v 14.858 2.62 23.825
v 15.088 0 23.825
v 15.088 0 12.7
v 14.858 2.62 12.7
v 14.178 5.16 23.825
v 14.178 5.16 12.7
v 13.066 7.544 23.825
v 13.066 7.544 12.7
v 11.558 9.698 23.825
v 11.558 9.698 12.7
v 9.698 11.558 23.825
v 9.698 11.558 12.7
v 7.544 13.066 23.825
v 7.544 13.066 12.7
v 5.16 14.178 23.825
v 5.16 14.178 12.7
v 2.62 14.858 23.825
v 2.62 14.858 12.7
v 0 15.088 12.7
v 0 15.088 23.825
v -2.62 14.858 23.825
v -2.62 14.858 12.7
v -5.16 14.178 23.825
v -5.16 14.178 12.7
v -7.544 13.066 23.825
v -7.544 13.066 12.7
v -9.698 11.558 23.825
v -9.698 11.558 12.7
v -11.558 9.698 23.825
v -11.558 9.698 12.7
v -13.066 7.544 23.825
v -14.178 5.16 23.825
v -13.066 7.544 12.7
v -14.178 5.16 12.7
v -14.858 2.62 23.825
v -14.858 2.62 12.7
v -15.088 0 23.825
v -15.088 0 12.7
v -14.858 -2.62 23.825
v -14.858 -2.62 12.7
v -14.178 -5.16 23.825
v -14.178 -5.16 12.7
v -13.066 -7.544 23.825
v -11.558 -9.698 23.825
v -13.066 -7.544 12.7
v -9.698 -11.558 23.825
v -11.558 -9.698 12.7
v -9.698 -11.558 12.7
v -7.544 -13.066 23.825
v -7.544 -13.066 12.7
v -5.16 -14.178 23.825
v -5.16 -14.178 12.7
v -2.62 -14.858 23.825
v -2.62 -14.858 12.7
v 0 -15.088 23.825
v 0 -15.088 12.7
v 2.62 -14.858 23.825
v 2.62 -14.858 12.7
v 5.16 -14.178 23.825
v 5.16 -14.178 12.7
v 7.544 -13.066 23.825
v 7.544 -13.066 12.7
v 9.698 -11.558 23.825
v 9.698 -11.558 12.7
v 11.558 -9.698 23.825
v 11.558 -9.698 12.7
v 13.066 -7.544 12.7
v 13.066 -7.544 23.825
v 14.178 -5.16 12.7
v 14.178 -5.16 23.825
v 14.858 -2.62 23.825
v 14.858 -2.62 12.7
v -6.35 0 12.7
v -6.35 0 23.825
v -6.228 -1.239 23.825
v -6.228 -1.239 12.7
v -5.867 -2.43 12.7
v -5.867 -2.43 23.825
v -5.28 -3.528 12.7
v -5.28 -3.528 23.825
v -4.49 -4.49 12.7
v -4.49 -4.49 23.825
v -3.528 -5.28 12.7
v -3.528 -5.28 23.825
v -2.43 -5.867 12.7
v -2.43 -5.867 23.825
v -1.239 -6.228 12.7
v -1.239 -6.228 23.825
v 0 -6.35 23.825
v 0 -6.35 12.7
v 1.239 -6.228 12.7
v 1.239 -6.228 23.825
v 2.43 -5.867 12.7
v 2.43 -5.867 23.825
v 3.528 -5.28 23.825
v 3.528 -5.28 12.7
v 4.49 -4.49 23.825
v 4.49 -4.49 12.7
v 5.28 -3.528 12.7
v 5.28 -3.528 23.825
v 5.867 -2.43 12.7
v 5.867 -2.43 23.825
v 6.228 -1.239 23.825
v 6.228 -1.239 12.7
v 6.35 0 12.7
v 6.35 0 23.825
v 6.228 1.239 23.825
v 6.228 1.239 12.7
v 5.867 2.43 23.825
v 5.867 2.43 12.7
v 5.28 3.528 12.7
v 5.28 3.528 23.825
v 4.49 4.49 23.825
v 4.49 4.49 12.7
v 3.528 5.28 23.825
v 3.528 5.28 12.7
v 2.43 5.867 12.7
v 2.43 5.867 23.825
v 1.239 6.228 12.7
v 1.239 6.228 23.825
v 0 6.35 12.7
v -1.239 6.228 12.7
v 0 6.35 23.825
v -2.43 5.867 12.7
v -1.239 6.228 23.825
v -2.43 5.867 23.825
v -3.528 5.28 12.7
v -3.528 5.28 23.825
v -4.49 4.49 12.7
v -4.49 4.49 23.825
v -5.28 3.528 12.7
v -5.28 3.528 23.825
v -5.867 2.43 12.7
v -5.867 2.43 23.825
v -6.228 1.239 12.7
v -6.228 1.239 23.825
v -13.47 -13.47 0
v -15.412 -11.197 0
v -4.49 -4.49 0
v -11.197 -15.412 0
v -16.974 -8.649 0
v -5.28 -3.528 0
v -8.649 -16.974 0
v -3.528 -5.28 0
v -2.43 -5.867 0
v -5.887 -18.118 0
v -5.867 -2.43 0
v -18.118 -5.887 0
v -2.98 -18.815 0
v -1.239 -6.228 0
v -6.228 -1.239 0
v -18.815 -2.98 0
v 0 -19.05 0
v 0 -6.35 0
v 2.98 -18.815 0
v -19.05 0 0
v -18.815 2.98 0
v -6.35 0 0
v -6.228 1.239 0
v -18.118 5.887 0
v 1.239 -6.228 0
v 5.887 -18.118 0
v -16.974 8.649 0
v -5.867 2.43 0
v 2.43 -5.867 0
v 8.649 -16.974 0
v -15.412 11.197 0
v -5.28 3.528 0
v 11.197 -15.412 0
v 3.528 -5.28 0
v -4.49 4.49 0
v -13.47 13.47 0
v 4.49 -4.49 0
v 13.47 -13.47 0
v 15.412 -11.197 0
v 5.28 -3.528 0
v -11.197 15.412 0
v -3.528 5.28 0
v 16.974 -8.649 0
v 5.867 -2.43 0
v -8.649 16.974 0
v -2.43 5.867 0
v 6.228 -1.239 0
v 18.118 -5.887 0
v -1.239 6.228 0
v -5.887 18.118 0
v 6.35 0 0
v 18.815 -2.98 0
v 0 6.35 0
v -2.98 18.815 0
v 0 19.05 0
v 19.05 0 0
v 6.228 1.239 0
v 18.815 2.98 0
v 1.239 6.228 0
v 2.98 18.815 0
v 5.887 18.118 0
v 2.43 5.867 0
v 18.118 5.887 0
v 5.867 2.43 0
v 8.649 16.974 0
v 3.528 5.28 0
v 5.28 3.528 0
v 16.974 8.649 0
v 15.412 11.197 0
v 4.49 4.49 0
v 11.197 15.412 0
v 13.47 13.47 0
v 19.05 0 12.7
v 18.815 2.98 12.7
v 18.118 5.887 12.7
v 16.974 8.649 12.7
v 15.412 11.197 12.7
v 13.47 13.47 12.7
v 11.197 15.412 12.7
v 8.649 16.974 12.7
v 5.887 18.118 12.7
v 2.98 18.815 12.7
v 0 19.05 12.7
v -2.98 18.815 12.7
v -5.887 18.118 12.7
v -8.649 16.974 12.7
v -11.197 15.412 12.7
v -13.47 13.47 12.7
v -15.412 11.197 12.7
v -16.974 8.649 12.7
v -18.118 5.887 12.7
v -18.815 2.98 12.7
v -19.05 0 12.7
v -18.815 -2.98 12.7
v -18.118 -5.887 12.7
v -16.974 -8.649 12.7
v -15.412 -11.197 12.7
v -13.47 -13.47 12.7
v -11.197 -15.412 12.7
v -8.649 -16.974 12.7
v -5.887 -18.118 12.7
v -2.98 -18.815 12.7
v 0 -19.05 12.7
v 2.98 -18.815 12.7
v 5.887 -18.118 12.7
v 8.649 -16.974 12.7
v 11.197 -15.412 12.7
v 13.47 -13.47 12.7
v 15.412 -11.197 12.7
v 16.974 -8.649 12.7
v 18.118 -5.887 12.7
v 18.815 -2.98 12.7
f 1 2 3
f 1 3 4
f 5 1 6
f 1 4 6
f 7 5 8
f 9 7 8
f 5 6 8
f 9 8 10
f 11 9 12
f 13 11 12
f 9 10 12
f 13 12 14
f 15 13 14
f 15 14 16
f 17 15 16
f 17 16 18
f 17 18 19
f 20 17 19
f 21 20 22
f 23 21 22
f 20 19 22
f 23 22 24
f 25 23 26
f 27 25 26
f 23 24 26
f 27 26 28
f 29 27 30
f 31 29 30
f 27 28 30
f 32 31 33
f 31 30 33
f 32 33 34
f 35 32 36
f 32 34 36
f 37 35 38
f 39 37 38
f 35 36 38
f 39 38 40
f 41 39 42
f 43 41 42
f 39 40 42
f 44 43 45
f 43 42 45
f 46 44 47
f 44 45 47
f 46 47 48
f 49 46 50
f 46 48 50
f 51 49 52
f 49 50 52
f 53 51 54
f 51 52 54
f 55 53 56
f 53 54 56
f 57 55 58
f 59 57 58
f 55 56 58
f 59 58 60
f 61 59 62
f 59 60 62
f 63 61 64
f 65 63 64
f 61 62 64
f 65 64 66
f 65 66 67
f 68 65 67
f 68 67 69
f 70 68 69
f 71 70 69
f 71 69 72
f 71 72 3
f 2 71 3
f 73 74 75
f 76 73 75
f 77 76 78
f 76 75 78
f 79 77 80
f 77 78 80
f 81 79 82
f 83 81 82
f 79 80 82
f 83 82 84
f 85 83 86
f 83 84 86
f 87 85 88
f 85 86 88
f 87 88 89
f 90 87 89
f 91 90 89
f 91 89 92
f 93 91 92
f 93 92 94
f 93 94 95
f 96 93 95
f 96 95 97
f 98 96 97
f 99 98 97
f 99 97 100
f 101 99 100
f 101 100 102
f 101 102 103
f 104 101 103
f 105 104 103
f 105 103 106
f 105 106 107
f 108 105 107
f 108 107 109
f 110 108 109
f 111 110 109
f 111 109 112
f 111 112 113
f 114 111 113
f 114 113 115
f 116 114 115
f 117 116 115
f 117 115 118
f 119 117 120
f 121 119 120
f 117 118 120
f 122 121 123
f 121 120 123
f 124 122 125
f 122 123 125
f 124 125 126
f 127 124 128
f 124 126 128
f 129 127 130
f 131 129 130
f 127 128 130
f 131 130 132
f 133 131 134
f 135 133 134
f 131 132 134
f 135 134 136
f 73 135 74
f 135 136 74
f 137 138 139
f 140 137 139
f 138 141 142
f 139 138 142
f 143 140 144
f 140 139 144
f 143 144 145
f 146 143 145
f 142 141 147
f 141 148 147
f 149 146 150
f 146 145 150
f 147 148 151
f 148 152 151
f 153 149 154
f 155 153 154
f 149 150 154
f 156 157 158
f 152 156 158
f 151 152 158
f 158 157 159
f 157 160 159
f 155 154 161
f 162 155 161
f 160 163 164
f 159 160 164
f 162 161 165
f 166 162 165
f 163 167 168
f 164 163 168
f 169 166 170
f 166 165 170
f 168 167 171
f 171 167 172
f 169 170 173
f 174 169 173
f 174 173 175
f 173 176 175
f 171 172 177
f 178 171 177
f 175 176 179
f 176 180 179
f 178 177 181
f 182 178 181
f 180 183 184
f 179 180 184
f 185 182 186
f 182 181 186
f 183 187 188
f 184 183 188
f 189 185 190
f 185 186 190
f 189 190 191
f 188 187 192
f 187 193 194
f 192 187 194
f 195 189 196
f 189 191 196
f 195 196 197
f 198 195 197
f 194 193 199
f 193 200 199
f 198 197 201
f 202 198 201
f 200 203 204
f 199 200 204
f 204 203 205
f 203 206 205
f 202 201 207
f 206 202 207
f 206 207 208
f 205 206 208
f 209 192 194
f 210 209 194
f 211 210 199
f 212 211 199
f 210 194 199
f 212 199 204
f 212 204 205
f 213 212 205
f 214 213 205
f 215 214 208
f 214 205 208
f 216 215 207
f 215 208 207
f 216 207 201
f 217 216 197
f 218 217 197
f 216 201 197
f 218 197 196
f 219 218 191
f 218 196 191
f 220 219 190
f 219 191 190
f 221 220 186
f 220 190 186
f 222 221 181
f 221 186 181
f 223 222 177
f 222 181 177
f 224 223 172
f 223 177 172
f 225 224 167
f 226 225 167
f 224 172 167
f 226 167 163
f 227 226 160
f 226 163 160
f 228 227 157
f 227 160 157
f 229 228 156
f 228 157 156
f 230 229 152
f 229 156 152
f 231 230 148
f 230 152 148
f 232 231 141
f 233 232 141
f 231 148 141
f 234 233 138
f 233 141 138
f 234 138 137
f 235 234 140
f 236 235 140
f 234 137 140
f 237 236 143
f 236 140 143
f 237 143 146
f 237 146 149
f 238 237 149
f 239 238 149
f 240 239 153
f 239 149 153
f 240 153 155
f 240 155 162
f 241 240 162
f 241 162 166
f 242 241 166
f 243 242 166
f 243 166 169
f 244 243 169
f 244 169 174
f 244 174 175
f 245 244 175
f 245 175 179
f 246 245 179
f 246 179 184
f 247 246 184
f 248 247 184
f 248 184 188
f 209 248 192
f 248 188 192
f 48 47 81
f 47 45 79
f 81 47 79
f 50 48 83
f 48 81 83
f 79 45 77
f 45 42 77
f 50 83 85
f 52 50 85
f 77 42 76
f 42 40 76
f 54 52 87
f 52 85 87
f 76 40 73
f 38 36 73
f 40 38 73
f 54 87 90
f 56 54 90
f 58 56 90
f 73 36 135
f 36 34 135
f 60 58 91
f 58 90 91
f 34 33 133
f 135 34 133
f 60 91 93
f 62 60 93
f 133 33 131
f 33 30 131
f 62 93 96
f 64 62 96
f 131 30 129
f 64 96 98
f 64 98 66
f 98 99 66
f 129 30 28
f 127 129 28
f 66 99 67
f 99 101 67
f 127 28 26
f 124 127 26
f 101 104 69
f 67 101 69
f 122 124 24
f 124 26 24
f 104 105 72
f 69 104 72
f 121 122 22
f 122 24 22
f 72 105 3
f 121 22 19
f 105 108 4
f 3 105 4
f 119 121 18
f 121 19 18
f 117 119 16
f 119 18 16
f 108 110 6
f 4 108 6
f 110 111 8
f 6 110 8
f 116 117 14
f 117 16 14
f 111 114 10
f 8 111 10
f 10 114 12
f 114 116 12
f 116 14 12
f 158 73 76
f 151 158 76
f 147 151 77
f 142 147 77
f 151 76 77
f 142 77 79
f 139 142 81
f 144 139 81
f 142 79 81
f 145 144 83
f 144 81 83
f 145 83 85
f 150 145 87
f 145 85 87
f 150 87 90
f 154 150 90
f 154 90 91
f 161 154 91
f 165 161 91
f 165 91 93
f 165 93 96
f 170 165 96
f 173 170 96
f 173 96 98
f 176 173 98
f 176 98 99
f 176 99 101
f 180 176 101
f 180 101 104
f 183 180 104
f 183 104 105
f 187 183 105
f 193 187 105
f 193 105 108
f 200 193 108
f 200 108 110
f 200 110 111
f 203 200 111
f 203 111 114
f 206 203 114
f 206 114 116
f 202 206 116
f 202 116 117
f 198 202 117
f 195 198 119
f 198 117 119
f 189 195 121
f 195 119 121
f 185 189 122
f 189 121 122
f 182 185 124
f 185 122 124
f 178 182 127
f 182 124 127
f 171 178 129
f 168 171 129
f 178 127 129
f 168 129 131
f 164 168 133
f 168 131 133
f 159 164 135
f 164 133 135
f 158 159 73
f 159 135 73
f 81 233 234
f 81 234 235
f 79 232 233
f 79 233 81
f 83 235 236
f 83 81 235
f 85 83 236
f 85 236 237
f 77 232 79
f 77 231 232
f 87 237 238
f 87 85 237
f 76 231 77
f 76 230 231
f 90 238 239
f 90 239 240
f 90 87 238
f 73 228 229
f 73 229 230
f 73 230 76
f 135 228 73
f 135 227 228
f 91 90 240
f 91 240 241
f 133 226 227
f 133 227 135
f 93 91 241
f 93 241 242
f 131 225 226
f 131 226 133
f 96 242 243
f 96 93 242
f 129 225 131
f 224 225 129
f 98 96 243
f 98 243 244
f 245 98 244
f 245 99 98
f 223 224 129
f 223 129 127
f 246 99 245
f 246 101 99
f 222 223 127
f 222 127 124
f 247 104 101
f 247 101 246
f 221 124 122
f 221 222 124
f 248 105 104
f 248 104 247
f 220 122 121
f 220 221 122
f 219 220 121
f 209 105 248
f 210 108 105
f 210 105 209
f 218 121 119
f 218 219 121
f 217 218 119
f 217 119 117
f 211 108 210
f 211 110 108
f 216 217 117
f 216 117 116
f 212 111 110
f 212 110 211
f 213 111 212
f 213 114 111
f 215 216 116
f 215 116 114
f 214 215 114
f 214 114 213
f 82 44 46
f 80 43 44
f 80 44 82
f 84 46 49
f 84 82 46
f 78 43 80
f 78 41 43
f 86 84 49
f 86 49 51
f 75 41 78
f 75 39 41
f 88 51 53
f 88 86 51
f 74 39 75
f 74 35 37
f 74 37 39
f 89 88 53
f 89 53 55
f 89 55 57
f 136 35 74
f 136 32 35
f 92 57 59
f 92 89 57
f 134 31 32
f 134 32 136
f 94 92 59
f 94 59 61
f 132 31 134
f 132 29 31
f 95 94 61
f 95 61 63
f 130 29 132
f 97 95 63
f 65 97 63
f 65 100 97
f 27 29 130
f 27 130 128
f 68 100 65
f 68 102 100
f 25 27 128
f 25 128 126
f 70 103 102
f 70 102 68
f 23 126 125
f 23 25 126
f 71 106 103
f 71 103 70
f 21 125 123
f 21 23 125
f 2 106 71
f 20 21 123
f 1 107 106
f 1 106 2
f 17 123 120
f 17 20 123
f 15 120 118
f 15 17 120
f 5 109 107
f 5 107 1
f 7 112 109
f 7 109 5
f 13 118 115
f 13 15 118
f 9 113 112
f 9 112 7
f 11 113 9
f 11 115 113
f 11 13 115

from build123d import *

# Parameters (mm, degrees)
F0_R     = 19.05
F1_DEPTH = 12.7
F2_R     = 15.0876
F3_DEPTH = 11.1252
F5_D     = 12.7
F5_2_D   = 12.7


with BuildPart() as f1:
    # F0 (on Top) → F1 (new body)
    with BuildSketch(Plane.XY):
        Circle(F0_R)
    extrude(amount=F1_DEPTH)

    # F5 (through all)
    with Locations(Plane(origin=(0, 0, 0), x_dir=(1, 0, 0), z_dir=(0, 0, -1))):
        with Locations((0, 0)):
            Hole(F5_D / 2)


with BuildPart() as f3:
    # F2 (on face) → F3 (new body)
    with BuildSketch(Plane.XY.offset(12.7)):
        Circle(F2_R)
    extrude(amount=F3_DEPTH)

    # F5#2 (through all)
    with Locations(Plane(origin=(0, 0, 0), x_dir=(1, 0, 0), z_dir=(0, 0, -1))):
        with Locations((0, 0)):
            Hole(F5_2_D / 2)


solid = Compound([f1.part, f3.part])
